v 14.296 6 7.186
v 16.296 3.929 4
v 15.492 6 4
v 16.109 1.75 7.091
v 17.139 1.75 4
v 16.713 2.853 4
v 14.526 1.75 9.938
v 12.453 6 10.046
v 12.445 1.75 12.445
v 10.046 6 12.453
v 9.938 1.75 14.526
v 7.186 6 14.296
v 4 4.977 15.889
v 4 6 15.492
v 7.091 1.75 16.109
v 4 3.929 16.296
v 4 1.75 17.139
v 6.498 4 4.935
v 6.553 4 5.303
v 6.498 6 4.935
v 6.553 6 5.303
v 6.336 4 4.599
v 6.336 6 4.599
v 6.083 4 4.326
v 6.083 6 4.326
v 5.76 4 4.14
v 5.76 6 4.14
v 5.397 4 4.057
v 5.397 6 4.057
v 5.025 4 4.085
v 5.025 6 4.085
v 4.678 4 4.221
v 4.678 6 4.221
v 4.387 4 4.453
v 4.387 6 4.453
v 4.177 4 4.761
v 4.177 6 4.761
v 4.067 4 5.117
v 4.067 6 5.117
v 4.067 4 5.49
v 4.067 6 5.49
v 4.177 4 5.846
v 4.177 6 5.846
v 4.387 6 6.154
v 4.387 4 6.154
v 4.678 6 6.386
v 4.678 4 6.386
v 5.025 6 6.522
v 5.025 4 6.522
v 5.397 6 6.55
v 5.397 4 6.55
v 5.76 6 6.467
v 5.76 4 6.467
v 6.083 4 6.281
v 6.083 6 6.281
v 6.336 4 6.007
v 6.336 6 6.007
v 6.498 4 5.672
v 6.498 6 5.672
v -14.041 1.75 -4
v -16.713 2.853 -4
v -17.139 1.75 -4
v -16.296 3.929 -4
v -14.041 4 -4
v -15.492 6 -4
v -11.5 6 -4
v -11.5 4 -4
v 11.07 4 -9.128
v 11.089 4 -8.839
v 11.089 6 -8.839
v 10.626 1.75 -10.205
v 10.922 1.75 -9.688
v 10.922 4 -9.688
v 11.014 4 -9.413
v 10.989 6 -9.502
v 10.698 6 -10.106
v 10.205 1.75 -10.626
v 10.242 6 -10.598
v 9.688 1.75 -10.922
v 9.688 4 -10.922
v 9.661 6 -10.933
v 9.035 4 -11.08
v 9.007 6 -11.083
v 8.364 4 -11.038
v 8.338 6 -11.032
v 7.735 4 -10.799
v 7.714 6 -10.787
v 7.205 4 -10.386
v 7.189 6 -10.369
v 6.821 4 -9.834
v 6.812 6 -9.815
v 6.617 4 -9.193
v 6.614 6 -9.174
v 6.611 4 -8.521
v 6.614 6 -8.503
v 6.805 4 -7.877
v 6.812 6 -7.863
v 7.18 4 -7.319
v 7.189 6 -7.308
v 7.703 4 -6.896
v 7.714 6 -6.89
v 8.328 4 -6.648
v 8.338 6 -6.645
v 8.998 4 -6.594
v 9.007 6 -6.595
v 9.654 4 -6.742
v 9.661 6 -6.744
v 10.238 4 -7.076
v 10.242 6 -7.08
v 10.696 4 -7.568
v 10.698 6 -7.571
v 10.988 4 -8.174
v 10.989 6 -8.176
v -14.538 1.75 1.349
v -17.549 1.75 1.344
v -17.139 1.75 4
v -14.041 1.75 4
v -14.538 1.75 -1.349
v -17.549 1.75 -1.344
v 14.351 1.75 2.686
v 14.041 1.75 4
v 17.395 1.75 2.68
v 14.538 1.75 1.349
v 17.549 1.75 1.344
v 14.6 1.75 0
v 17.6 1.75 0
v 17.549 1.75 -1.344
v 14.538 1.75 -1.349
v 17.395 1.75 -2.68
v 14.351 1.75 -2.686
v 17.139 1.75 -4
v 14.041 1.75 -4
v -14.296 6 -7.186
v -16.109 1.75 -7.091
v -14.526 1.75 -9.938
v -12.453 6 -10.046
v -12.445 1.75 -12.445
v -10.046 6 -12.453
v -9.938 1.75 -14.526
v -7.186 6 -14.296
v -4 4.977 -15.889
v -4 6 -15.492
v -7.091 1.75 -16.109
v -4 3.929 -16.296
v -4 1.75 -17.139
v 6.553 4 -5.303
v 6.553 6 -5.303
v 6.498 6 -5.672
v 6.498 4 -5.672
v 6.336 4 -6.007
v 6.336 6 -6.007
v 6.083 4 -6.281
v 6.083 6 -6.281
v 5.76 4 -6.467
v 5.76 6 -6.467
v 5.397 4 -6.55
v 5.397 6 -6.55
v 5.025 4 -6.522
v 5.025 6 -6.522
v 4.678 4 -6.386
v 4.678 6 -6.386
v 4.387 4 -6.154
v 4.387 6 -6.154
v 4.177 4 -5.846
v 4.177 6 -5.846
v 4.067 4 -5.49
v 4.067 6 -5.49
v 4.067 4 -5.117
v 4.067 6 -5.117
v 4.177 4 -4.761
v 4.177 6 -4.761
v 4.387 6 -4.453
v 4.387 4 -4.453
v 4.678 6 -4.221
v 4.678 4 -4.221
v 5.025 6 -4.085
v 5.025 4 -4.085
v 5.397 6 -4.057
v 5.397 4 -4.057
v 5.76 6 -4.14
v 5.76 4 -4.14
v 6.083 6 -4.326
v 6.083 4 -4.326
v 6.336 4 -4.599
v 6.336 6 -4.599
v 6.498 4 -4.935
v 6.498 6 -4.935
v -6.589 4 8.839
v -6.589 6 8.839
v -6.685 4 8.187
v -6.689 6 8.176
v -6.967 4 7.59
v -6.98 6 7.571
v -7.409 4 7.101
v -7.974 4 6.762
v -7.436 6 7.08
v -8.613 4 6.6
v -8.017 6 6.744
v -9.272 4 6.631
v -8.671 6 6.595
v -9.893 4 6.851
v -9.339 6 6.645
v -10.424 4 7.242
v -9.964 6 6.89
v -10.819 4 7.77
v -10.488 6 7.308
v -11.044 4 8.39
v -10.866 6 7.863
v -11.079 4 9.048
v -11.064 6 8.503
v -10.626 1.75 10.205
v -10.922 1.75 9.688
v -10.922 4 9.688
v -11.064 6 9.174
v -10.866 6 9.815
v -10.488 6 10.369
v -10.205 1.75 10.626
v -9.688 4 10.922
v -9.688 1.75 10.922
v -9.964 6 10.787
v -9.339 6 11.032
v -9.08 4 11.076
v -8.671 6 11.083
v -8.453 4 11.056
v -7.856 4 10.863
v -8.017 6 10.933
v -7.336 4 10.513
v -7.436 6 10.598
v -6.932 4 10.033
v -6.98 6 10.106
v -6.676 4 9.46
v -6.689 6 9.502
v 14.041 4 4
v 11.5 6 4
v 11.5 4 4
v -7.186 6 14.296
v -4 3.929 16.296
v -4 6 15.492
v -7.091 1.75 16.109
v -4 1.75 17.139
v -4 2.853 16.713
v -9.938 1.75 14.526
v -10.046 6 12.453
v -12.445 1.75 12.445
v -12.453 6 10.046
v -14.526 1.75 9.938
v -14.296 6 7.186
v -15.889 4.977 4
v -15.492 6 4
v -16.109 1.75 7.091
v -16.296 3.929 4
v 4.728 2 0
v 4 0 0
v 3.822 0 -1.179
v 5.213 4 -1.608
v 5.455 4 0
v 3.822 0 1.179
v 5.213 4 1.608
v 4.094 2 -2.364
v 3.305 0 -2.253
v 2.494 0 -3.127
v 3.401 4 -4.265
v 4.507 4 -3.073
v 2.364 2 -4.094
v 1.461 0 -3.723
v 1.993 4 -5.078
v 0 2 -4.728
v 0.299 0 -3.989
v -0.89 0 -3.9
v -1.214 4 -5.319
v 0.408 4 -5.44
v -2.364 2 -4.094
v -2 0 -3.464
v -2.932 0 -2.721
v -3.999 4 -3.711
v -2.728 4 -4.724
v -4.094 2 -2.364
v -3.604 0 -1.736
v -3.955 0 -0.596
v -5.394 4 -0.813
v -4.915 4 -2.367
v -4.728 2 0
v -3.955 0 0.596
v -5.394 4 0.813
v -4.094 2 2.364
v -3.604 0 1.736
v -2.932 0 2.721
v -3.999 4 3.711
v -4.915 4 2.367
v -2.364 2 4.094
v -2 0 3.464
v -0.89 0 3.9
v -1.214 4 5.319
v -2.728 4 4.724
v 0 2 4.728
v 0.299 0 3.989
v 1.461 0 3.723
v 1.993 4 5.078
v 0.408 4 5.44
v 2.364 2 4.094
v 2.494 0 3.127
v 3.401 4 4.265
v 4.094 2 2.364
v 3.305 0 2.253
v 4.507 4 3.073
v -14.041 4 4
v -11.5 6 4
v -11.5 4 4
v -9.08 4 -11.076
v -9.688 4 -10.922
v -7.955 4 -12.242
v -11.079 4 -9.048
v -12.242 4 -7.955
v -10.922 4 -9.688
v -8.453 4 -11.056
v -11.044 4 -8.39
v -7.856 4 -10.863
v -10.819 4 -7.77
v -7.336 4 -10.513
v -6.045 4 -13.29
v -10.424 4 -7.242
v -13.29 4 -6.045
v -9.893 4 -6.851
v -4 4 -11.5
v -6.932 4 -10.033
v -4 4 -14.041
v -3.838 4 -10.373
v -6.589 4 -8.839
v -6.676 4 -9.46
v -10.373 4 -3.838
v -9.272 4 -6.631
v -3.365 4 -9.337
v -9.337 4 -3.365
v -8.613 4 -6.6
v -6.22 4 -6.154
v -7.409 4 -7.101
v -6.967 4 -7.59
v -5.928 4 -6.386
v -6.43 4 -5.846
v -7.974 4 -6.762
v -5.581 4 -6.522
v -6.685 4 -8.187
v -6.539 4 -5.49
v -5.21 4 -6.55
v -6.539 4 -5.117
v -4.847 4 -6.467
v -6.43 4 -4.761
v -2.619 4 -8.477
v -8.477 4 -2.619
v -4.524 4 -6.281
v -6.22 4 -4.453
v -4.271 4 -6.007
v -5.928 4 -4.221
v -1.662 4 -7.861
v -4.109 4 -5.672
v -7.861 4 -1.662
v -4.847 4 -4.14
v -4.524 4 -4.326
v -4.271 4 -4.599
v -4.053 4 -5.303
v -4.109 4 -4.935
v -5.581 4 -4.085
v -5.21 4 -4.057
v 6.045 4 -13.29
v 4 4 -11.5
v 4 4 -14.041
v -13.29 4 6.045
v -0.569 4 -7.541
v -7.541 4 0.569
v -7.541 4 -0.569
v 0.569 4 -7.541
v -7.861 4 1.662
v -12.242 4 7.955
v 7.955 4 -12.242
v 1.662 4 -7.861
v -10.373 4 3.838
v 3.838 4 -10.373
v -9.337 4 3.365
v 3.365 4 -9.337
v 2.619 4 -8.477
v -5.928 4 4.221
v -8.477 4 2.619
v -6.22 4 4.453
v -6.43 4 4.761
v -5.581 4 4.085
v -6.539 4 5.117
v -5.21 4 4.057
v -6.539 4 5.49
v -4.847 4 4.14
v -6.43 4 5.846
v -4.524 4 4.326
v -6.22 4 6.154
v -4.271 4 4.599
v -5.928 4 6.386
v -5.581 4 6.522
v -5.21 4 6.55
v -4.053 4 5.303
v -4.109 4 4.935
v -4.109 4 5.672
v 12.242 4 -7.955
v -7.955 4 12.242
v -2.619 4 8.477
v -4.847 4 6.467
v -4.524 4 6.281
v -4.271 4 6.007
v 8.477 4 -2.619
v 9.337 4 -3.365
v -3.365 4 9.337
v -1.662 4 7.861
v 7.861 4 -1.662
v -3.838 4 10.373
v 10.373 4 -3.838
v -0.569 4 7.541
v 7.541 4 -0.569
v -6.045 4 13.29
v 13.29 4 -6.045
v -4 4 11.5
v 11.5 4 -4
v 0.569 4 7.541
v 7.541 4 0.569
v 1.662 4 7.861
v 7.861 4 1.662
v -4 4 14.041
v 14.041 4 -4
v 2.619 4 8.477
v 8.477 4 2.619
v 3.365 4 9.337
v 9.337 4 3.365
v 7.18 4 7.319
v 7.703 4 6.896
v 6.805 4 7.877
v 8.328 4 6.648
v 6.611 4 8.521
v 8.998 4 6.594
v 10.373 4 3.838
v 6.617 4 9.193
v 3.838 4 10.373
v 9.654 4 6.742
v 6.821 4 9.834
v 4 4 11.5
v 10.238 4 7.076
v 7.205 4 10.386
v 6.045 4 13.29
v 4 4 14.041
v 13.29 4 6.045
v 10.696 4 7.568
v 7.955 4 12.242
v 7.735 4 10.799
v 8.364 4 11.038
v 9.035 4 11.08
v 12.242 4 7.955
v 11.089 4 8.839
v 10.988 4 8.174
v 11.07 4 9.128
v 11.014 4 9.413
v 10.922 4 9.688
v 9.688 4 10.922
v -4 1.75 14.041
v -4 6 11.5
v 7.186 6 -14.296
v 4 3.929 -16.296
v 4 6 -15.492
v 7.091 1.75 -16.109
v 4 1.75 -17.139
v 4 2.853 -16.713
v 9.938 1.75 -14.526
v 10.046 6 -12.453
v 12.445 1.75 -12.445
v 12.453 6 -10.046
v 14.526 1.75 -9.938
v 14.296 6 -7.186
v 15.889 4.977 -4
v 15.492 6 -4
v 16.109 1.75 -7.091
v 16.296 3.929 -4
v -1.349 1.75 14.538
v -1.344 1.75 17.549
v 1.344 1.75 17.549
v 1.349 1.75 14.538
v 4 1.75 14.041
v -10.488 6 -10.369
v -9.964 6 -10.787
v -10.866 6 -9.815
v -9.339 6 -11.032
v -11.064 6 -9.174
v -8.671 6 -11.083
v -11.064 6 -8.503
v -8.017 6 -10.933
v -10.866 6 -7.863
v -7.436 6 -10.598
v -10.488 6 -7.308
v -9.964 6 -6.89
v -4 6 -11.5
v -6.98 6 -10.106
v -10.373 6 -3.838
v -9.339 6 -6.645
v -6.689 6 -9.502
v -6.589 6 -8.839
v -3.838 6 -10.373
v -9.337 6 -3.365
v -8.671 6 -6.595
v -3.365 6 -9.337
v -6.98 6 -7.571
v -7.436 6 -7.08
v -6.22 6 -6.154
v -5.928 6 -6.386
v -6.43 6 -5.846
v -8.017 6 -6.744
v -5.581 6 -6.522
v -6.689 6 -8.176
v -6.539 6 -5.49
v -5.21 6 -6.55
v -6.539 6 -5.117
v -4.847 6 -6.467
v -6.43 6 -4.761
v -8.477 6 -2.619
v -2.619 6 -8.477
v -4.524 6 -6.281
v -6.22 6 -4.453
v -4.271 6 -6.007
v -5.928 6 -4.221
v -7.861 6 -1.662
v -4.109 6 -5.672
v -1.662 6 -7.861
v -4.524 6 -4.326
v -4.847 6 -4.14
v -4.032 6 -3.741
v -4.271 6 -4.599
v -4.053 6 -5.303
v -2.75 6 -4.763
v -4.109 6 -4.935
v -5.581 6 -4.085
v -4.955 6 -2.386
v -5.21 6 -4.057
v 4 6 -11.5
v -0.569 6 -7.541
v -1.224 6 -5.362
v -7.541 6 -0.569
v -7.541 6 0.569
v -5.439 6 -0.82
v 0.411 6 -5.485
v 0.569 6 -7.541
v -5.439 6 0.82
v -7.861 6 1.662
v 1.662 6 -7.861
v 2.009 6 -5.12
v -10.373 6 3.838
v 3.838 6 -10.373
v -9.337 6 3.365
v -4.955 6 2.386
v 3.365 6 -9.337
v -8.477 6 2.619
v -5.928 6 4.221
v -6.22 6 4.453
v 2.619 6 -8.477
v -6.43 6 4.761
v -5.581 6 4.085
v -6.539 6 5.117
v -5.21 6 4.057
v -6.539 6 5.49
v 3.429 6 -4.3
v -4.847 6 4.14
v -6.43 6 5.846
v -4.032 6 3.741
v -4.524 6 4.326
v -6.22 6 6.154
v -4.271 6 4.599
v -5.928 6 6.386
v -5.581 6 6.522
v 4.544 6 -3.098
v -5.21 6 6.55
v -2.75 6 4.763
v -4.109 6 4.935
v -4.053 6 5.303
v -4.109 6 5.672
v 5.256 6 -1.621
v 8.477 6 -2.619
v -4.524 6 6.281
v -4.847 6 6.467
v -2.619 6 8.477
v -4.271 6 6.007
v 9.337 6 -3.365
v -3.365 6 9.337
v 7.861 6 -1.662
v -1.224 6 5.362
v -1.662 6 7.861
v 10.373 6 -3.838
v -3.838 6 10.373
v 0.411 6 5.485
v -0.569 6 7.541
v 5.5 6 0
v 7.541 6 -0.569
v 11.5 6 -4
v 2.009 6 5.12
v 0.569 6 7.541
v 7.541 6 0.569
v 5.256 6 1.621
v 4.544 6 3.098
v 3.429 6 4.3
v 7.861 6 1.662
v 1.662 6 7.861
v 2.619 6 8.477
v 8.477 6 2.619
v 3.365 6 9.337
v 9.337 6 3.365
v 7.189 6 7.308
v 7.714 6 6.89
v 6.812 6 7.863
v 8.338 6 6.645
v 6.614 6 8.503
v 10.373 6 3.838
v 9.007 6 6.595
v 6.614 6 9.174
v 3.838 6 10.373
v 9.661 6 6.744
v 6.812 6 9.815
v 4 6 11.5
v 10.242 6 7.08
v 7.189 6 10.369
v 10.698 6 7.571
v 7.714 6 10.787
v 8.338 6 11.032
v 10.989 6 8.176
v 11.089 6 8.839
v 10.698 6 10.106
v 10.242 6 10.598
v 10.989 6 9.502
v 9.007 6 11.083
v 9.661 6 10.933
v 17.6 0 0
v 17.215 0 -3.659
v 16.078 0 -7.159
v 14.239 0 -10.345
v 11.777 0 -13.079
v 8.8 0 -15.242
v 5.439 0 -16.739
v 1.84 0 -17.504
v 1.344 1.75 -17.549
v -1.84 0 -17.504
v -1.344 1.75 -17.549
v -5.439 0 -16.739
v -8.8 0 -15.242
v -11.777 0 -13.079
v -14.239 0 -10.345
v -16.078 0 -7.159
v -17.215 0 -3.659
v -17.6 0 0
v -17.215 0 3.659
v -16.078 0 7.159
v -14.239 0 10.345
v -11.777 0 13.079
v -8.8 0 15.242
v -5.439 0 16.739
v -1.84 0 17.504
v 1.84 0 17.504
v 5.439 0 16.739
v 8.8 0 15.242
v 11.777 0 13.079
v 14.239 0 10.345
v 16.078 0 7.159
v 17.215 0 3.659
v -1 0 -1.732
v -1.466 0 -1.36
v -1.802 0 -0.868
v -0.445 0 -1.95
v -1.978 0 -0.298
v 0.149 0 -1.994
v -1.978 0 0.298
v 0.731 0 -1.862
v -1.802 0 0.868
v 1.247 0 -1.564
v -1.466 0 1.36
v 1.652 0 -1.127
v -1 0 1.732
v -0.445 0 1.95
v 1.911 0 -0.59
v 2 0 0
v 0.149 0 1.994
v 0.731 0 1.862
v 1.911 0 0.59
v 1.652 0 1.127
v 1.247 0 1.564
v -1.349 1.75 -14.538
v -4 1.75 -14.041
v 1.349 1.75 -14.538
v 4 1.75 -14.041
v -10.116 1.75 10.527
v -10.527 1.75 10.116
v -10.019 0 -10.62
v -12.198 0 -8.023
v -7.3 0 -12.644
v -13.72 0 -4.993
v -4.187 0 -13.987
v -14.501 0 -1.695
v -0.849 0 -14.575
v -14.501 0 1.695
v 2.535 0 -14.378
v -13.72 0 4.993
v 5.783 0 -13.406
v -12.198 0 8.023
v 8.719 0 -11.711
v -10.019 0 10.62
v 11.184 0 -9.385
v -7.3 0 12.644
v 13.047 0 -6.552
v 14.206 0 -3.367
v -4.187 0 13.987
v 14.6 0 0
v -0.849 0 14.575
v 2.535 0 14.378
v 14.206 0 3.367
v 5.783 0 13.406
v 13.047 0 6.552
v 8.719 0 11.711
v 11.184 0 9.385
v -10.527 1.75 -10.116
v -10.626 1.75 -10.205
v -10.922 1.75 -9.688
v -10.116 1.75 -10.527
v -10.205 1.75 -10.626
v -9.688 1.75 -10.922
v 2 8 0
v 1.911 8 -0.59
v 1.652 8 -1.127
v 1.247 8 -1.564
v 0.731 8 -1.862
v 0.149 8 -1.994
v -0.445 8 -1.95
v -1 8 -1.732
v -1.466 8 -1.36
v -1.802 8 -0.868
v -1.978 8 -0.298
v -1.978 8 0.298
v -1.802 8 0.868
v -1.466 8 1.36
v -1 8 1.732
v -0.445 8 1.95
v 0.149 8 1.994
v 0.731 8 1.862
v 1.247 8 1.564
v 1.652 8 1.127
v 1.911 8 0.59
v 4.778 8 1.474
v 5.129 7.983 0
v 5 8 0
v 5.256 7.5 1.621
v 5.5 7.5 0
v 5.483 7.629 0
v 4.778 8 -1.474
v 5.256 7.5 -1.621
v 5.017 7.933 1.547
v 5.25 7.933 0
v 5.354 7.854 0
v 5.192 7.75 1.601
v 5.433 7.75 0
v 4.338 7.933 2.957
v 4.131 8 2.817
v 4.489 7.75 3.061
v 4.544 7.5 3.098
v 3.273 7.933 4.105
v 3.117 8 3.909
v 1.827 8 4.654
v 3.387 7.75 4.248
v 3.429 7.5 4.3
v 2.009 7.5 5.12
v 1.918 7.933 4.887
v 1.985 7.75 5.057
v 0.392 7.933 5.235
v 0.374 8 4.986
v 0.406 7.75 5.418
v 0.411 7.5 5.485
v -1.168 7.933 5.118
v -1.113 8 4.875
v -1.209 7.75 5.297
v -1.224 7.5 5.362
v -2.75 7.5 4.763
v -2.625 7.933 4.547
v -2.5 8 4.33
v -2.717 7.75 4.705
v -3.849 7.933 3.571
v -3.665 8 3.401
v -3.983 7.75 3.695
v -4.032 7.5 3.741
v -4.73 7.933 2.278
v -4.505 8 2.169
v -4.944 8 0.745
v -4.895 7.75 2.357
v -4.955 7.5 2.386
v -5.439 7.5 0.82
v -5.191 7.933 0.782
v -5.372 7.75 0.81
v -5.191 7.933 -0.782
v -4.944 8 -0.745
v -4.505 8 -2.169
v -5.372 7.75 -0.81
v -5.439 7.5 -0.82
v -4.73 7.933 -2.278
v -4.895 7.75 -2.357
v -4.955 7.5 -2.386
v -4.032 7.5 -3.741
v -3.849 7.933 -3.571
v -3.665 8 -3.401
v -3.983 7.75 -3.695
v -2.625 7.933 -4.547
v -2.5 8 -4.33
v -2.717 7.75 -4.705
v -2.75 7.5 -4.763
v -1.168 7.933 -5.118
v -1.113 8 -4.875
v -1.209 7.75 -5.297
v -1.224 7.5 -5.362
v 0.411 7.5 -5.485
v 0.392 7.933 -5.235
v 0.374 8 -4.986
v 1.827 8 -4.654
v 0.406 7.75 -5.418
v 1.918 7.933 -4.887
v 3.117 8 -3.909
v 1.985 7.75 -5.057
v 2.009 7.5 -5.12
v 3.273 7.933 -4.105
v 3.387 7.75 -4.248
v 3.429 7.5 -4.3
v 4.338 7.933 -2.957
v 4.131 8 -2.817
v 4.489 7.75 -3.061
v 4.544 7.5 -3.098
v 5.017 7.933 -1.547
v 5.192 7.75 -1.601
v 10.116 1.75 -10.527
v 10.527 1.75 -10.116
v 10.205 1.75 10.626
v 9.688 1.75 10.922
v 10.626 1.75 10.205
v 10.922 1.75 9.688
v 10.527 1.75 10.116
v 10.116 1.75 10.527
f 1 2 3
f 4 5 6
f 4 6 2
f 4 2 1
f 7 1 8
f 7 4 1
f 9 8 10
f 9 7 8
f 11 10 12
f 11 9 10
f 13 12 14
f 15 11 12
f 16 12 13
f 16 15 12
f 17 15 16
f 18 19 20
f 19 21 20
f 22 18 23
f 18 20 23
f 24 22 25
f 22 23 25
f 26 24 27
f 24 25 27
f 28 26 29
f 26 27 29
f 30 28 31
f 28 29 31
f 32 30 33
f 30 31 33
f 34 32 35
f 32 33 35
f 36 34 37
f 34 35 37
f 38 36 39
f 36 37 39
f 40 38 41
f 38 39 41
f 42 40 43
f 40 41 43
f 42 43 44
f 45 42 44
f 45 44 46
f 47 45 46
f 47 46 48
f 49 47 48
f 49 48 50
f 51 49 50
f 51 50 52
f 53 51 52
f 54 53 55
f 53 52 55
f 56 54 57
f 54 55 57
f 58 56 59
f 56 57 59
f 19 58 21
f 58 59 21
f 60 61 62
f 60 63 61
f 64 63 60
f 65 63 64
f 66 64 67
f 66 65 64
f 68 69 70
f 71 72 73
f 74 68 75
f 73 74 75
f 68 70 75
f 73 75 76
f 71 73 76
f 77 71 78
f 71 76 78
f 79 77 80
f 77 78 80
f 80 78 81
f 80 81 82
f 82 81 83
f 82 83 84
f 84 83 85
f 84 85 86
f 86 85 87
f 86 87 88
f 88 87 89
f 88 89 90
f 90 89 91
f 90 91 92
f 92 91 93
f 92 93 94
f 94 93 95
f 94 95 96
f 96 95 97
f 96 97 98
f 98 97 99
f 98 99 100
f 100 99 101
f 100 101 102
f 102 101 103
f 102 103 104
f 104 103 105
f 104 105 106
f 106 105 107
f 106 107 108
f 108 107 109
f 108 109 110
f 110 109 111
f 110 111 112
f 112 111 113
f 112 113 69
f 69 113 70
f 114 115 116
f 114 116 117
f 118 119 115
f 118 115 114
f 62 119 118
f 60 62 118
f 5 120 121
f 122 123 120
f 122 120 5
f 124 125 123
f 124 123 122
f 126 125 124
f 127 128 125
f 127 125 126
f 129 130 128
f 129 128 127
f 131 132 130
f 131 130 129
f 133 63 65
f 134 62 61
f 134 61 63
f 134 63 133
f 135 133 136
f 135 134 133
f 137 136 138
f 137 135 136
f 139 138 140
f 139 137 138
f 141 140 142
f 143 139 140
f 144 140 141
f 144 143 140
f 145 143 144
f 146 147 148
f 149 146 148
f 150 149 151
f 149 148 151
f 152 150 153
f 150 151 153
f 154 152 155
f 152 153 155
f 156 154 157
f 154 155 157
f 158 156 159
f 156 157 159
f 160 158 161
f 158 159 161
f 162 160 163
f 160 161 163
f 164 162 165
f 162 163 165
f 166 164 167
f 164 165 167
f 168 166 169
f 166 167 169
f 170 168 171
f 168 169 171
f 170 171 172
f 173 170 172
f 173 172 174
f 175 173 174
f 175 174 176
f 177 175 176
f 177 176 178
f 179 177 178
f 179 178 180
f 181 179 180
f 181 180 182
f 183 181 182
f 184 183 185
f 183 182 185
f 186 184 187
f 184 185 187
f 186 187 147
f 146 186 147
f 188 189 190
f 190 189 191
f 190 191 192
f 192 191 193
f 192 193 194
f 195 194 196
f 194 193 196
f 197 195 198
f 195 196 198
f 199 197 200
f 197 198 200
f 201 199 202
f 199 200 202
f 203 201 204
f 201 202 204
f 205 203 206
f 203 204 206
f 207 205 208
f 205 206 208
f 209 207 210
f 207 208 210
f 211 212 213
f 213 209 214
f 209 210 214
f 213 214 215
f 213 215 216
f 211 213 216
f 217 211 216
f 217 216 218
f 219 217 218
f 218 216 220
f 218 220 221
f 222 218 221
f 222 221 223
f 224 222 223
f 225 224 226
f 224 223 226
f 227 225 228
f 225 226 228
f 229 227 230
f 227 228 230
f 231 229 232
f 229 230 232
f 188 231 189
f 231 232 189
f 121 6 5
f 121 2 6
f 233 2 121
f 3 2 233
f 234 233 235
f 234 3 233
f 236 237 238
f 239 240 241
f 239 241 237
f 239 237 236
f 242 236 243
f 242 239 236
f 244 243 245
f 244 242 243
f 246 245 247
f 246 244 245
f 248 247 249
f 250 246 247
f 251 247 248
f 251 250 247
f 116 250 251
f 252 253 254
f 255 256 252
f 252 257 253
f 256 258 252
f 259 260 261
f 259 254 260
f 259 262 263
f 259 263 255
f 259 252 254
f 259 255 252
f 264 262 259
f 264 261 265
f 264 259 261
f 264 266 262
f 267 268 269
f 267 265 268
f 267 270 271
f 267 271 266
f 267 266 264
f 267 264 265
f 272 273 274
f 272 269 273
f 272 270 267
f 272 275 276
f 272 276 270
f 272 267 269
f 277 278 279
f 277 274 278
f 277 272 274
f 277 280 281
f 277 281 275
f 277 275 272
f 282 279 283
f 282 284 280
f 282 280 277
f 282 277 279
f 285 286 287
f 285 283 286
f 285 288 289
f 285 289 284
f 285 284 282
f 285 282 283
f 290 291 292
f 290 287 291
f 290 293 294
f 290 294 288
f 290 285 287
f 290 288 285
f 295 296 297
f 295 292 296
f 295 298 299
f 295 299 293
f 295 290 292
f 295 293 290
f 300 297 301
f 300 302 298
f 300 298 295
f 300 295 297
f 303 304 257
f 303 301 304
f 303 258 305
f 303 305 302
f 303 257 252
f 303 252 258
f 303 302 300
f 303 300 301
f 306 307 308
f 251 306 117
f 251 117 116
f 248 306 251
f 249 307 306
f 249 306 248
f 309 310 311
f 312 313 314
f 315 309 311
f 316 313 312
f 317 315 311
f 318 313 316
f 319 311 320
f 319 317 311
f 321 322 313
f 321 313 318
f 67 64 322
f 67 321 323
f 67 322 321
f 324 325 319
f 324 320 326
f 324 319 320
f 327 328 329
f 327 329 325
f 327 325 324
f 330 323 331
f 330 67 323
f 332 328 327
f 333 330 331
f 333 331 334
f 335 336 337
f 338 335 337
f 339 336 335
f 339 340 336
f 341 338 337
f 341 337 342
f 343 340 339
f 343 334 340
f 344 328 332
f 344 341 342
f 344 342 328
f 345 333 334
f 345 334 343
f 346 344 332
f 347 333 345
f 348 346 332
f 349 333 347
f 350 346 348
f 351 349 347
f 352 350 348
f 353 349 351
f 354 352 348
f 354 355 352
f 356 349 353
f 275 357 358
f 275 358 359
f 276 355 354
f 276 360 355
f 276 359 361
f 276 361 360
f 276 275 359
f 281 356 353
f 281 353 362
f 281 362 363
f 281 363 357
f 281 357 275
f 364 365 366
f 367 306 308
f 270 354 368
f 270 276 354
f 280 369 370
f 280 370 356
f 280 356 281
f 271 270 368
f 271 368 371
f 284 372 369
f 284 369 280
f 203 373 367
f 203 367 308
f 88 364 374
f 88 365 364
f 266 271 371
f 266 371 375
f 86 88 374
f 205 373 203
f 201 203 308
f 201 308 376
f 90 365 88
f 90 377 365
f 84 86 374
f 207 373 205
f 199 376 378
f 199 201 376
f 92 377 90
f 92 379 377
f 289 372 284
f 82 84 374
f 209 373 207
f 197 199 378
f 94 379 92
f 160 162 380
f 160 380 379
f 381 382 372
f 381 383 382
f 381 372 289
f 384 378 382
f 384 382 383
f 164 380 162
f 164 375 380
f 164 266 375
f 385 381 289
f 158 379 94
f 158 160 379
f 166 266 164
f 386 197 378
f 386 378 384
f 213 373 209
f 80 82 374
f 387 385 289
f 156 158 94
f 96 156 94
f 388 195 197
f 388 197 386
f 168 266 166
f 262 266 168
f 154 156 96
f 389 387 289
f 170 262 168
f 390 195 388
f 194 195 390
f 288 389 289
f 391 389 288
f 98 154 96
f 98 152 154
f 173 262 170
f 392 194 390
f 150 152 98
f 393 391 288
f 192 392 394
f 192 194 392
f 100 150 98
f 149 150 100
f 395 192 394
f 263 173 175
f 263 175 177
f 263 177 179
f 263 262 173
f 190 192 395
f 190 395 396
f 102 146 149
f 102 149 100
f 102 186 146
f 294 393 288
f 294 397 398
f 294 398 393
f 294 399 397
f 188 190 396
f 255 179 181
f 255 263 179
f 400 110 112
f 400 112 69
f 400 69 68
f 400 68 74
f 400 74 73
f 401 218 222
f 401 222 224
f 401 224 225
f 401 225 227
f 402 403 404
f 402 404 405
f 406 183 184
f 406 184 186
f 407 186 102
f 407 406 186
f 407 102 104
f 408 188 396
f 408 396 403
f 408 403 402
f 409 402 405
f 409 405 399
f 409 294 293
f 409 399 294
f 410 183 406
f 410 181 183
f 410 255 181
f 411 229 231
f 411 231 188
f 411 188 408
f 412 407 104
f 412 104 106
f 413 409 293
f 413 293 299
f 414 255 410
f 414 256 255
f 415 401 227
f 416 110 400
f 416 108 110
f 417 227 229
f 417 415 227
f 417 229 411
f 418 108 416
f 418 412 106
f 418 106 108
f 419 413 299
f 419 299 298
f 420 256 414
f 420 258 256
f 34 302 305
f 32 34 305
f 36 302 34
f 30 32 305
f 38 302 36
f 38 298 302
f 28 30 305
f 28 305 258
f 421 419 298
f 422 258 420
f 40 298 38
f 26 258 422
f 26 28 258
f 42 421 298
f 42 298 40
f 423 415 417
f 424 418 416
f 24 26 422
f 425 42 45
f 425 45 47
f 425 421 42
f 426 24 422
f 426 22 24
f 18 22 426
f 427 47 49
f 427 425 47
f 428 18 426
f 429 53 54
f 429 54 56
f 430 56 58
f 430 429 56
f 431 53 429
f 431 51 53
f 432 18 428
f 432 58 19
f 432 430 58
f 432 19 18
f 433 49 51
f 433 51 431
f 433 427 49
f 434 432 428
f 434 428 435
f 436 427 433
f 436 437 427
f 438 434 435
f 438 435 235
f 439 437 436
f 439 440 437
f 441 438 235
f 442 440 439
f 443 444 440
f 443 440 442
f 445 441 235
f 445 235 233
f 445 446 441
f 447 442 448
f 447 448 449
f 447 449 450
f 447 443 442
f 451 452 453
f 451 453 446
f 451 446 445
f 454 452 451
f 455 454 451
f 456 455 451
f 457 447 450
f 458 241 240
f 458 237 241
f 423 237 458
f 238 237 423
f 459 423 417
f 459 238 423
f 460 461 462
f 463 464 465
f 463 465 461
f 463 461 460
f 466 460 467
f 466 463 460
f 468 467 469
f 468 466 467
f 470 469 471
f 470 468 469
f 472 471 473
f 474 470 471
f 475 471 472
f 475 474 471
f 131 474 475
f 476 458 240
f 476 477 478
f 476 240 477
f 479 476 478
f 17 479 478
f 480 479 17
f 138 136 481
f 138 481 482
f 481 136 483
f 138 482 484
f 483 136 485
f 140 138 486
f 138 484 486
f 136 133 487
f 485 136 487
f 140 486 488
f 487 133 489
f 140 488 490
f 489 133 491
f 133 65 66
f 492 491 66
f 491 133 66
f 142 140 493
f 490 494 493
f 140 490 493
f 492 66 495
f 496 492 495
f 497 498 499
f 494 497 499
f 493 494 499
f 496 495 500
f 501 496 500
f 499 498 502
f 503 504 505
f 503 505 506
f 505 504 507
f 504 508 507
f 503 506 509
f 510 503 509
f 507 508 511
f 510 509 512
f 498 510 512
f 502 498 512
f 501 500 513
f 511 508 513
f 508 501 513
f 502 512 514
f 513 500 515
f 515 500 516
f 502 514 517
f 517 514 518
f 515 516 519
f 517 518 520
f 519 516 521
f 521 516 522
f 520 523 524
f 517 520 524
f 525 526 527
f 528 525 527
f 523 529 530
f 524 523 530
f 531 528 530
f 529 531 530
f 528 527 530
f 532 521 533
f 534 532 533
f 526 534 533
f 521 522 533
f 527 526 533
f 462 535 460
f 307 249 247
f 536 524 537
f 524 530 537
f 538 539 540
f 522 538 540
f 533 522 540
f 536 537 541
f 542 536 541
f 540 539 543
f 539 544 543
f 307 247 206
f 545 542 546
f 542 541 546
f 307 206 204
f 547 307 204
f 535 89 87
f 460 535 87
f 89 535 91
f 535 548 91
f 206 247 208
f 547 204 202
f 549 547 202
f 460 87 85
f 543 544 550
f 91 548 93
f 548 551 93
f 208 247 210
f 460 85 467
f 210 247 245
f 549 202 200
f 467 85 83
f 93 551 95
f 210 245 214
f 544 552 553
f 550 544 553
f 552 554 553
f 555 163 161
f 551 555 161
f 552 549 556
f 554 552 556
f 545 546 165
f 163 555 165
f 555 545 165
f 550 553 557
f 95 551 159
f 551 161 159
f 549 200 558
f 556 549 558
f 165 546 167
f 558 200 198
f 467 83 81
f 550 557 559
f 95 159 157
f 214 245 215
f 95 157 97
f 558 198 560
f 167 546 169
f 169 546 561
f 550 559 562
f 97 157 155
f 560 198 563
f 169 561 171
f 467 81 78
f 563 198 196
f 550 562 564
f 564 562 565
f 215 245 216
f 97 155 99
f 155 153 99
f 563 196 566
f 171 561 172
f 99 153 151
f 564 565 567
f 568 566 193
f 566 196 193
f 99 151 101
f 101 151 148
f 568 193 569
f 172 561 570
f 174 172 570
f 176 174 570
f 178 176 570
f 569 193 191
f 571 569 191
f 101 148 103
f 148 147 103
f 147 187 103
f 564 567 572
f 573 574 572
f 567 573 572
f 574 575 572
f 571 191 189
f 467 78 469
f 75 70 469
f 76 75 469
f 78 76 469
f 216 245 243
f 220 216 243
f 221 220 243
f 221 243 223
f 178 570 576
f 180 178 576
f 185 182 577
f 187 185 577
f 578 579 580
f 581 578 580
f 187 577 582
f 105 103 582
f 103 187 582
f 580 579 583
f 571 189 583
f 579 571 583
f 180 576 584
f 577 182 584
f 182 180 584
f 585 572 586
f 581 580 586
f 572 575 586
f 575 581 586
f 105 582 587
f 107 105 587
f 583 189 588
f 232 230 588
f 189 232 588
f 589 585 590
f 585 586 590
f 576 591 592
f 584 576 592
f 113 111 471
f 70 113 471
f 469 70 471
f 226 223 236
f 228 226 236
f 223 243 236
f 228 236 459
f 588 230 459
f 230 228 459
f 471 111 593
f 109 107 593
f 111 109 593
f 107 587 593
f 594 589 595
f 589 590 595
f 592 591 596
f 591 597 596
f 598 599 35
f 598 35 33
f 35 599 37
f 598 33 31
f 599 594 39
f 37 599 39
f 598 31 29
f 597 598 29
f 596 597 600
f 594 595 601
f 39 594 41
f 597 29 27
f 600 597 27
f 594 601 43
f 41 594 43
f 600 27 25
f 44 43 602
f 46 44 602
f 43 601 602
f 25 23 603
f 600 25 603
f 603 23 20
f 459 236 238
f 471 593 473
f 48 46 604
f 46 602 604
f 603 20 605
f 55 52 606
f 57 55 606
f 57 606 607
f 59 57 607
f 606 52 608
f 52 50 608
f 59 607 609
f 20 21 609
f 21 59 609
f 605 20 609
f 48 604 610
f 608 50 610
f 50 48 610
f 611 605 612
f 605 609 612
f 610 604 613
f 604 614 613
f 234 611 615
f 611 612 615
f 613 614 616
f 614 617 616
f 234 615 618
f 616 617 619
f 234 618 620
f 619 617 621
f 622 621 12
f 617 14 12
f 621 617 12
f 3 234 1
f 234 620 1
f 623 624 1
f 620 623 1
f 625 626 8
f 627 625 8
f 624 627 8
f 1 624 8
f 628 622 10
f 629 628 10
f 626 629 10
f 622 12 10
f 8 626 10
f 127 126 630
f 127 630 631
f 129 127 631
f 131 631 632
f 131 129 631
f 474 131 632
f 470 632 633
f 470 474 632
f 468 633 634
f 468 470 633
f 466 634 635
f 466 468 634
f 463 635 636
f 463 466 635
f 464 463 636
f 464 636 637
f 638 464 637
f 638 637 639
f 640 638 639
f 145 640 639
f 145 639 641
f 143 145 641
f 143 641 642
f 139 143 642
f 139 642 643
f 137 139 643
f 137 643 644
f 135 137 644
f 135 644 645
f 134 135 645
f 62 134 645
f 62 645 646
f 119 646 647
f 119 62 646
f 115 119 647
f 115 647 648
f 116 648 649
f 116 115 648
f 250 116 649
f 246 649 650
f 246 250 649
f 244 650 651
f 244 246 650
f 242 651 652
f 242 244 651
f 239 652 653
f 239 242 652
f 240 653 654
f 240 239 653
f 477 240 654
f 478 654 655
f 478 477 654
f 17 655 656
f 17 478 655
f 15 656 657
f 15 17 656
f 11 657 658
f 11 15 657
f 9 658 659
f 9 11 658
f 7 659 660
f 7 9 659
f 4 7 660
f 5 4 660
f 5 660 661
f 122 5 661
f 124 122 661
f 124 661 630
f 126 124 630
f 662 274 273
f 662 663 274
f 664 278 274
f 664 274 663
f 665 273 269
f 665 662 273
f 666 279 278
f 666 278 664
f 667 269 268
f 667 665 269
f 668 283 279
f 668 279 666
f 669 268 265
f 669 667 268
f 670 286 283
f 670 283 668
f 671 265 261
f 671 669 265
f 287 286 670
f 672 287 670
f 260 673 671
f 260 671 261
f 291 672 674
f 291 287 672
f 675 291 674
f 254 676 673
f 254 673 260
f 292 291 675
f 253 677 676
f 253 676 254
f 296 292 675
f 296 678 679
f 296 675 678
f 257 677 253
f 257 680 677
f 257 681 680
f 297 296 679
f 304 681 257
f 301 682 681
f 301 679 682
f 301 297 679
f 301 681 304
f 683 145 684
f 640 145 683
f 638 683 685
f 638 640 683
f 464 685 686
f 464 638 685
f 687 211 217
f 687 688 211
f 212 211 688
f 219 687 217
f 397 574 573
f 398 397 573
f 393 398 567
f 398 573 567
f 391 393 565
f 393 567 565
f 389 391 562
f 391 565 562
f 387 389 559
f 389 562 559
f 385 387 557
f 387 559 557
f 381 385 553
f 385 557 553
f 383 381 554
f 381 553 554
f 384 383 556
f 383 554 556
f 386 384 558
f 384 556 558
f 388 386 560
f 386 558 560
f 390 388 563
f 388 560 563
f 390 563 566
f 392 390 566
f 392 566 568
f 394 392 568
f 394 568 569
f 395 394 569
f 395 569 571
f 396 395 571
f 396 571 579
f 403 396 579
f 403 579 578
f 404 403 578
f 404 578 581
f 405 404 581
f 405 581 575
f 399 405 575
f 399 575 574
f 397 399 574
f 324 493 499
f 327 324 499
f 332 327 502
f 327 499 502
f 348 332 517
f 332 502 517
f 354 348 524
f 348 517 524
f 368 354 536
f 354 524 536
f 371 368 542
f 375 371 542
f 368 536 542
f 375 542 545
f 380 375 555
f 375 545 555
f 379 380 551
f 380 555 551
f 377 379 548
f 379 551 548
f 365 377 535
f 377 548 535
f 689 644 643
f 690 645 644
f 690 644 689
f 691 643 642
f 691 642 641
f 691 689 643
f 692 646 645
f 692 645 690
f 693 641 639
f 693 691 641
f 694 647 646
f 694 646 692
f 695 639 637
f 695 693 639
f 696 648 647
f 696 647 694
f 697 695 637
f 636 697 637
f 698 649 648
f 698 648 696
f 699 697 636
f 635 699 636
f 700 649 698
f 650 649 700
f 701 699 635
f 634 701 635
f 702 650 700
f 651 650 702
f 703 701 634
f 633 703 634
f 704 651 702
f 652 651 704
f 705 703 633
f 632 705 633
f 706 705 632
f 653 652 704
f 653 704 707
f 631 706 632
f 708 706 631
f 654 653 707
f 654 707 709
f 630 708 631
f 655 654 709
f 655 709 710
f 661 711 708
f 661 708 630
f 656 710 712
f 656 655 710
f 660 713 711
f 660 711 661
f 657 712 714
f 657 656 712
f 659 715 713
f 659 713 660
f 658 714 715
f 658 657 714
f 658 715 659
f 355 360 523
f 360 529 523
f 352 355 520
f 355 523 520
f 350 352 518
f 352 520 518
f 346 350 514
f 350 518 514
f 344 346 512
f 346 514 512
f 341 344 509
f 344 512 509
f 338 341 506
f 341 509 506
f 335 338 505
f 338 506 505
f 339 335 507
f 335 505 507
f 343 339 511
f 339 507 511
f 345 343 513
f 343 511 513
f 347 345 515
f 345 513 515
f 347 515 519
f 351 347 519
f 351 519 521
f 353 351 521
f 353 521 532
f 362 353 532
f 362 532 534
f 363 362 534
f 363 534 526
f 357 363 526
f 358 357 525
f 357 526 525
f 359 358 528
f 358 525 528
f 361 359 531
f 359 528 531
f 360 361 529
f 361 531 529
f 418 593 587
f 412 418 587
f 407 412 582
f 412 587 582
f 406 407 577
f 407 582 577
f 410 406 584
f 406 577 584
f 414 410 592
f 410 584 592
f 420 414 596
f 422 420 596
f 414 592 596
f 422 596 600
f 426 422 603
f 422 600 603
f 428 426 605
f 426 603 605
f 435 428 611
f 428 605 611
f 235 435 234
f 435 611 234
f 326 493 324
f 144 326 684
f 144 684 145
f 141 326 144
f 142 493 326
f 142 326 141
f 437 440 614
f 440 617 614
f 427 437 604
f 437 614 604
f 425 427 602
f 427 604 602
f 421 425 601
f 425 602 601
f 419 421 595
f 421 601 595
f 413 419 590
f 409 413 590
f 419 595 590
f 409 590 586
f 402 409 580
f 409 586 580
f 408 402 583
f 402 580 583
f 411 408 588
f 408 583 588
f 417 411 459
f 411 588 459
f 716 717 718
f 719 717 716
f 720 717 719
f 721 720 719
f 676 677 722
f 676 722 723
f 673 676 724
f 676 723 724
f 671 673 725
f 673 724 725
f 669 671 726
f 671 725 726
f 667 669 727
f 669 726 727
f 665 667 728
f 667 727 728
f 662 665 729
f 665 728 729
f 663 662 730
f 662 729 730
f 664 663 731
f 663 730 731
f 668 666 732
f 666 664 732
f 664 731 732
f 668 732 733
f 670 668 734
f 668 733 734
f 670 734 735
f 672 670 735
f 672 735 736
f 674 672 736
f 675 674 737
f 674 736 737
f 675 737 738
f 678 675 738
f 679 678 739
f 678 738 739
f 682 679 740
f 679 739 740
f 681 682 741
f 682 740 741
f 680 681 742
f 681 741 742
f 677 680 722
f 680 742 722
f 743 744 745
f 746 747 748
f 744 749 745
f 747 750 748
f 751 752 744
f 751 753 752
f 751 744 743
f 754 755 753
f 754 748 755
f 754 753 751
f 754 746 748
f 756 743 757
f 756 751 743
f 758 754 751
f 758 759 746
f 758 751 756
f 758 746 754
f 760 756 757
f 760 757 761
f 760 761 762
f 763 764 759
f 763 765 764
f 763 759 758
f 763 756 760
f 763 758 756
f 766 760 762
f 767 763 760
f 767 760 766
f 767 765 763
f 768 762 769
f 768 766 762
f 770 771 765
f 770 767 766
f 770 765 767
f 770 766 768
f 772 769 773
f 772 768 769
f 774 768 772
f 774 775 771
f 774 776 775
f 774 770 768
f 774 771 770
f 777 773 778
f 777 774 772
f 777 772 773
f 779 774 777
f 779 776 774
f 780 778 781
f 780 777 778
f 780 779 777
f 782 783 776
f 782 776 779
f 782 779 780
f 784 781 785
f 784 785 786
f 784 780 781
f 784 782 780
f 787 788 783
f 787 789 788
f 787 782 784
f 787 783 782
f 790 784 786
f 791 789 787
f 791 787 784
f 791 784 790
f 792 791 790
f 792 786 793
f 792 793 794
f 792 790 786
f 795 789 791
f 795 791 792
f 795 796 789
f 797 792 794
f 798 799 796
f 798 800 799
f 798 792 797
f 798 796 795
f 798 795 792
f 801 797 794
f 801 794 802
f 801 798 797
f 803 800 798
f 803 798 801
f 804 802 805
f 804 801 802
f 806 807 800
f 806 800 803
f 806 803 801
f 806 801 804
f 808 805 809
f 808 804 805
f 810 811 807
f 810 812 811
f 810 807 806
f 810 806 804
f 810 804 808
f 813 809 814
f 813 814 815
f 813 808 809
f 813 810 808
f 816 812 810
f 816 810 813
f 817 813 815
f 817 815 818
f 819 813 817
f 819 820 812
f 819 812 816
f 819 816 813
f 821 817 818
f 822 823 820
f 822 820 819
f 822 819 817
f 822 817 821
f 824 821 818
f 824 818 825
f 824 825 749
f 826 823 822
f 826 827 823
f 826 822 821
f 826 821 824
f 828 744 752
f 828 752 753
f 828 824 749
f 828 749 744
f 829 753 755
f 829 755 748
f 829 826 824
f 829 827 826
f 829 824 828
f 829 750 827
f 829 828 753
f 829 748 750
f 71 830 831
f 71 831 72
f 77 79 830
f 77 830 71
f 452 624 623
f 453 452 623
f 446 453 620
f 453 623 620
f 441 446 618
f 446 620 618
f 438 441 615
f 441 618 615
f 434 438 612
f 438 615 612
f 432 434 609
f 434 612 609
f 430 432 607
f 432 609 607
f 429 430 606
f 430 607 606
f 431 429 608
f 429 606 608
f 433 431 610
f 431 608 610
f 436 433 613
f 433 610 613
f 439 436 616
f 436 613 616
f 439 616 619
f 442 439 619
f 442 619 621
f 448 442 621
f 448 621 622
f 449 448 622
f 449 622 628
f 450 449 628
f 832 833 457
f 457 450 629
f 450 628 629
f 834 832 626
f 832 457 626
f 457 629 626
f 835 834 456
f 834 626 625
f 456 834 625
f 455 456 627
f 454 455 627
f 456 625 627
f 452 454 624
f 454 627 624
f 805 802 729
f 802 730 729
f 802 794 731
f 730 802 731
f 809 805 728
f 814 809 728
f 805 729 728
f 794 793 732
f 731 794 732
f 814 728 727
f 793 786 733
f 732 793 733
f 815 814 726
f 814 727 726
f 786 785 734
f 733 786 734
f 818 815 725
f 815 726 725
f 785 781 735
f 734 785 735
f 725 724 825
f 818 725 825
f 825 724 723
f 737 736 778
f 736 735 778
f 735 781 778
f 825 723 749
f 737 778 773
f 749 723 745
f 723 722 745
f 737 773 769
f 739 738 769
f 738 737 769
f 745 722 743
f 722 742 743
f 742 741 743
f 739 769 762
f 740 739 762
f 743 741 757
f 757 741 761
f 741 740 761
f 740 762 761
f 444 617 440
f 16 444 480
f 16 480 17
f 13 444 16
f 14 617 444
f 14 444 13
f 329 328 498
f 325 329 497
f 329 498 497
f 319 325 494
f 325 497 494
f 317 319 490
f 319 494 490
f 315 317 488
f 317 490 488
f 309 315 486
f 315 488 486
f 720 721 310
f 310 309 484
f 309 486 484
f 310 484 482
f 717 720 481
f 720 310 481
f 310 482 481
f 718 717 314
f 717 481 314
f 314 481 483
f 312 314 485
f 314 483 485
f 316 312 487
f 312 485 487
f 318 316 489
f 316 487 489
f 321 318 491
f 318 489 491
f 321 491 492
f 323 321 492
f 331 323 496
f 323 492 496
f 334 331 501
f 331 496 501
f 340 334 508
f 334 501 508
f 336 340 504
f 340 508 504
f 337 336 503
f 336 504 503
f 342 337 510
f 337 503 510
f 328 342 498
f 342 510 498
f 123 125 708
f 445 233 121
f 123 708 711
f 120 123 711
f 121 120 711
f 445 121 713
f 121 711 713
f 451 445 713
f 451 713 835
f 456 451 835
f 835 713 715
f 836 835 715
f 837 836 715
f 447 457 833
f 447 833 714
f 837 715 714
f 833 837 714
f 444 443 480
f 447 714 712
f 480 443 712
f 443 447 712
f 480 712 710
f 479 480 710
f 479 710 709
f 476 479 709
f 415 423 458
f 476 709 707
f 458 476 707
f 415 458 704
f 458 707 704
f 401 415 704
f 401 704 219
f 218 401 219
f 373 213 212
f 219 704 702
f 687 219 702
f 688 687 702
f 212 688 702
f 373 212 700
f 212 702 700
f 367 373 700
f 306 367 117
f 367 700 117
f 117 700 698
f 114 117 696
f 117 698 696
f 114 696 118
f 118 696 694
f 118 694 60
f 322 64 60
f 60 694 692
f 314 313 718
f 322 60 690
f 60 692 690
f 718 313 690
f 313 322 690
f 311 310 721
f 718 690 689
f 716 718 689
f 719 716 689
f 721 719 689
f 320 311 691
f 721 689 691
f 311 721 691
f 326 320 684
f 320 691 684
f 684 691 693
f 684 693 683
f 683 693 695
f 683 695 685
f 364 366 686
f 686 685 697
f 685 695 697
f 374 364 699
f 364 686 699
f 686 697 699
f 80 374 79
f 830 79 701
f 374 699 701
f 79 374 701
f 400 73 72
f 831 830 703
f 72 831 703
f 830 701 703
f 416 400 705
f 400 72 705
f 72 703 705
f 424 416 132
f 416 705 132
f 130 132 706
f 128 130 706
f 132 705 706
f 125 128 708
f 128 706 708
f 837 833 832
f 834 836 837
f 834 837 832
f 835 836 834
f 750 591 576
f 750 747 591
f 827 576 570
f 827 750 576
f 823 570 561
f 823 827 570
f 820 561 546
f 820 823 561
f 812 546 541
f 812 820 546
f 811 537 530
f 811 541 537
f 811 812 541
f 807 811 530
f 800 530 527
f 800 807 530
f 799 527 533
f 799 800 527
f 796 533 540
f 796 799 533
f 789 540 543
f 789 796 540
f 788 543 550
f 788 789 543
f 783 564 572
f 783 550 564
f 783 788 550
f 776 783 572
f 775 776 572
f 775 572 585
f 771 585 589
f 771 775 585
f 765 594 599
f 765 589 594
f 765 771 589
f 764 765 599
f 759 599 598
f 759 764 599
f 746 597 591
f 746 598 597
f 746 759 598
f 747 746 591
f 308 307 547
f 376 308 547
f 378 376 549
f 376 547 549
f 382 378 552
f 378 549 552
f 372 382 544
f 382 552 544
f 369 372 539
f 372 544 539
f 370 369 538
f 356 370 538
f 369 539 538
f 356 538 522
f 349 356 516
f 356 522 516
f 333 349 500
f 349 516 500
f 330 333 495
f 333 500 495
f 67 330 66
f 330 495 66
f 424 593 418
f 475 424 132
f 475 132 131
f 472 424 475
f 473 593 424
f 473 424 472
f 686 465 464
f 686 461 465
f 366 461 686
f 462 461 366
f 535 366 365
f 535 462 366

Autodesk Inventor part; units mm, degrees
ref_plane "YZ Plane" through (0, 0, 0) normal (1, 0, 0) x (0, 1, 0)
ref_plane "XZ Plane" through (0, 0, 0) normal (0, 1, 0) x (-1, 0, 0)
ref_plane "XY Plane" through (0, 0, 0) normal (0, 0, 1) x (1, 0, 0)
sketch "Sketch1" plane through (0, 0, 0) normal (0, 0, 1) x (1, 0, 0)
  line L0 (0, 0) -> (17.6, 0)
  line L1 (17.6, 0) -> (17.6, 6)
  line L2 (17.6, 6) -> (0, 6)
  line L3 (0, 6) -> (0, 0) construction
  line L4 (0, 6) -> (5.5, 6)
  line L5 (5.5, 6) -> (5.5, 8)
  line L6 (5.5, 8) -> (0, 8)
  line L7 (0, 8) -> (0, 6) construction
  line L8 (16, 6) -> (16, 0) construction
  line L9 (16, 6) -> (17.6, 1.75)
  line L10 (0, 0) -> (2, 0)
  line L11 (2, 0) -> (2, 8)
  line L12 (2, 8) -> (0, 8)
  line L13 (0, 8) -> (0, 0) construction
  dimension "d0" = 17.6
  dimension "d1" = 6
  dimension "d2" = 5.5
  dimension "d3" = 2
  dimension "d4" = 16
  dimension "d5" = 1.75
  dimension "d6" = 2
revolve "Revolution1" add sketch "Sketch1" angle 360 about axis through (0, 8, 0) along (0, -1, 0) contours L11 L2 L9 L1 L0 | L11 L6 L5 L2
sketch "Sketch2" plane through (0, 6, 0) normal (0, 1, 0) x (1, 0, 0)
  arc A0 (-11.5, -4) -> (-11.5, 4) centre (-11.5, 0) ccw
  circle A1 centre (0, 0) radius 11.5 construction
  line L0 (-11.5, 0) -> (0, 0) construction
  line L1 (-11.5, -4) -> (-21.025, -4)
  line L2 (-21.025, -4) -> (-21.025, 4)
  line L3 (-21.025, 4) -> (-11.5, 4)
  line L4 (-11.5, 4) -> (-11.5, -4) construction
  circle A2 centre (0, 0) radius 2 projected
  circle A3 centre (0, 0) radius 7.5 construction
  circle A4 centre (0, 0) radius 12.5 construction
  line L5 (0, 0) -> (-8.8388, 8.8388) construction
  circle A5 centre (-5.3033, 5.3033) radius 1.25
  circle A6 centre (-8.8388, 8.8388) radius 2.25
  line L6 (-4, -11.5) -> (4, -11.5) construction
  line L7 (4, -11.5) -> (4, -21.025)
  line L8 (4, -21.025) -> (-4, -21.025)
  line L9 (-4, -21.025) -> (-4, -11.5)
  arc A7 (4, -11.5) -> (-4, -11.5) centre (0, -11.5) ccw
  circle A8 centre (-5.3033, -5.3033) radius 1.25
  circle A9 centre (-8.8388, -8.8388) radius 2.25
  line L10 (11.5, -4) -> (11.5, 4) construction
  line L11 (11.5, 4) -> (21.025, 4)
  line L12 (21.025, 4) -> (21.025, -4)
  line L13 (21.025, -4) -> (11.5, -4)
  arc A10 (11.5, 4) -> (11.5, -4) centre (11.5, 0) ccw
  circle A11 centre (5.3033, -5.3033) radius 1.25
  circle A12 centre (8.8388, -8.8388) radius 2.25
  line L14 (4, 11.5) -> (-4, 11.5) construction
  line L15 (-4, 11.5) -> (-4, 21.025)
  line L16 (-4, 21.025) -> (4, 21.025)
  line L17 (4, 21.025) -> (4, 11.5)
  arc A13 (-4, 11.5) -> (4, 11.5) centre (0, 11.5) ccw
  circle A14 centre (5.3033, 5.3033) radius 1.25
  circle A15 centre (8.8388, 8.8388) radius 2.25
  dimension "d9" = 23
  dimension "d11" = 15
  dimension "d12" = 25
  dimension "d8" = 8
  dimension "d10" = 9.525
  dimension "d13" = 45
  dimension "d14" = 2.5
  dimension "d15" = 4.5
  dimension "d18" = 360
extrude "Extrusion1" cut sketch "Sketch2" against normal blind 4.25
sketch "Sketch3" plane through (0, 0, 0) normal (0, -1, 0) x (1, 0, 0)
  circle A0 centre (0, 0) radius 2
  arc A1 (17.1394, 4) -> (4, 17.1394) centre (0, 0) ccw projected
  circle A2 centre (0, 0) radius 17.6
  circle A3 centre (0, 0) radius 14.6
  circle A4 centre (0, 0) radius 4
  dimension "d22" = 3
  dimension "d23" = 8
extrude "Extrusion2" cut sketch "Sketch3" against normal blind 4 contours A3
chamfer "Chamfer1" distance 4 angle 20 1 edges at (-4, 4, 0) measured on face at (3.987, 2.6667, -0.3219)
fillet "Fillet1" radius 0.5 1 edges at (-5.5, 8, 0)
properties part number "Top" material "Stainless Steel"
